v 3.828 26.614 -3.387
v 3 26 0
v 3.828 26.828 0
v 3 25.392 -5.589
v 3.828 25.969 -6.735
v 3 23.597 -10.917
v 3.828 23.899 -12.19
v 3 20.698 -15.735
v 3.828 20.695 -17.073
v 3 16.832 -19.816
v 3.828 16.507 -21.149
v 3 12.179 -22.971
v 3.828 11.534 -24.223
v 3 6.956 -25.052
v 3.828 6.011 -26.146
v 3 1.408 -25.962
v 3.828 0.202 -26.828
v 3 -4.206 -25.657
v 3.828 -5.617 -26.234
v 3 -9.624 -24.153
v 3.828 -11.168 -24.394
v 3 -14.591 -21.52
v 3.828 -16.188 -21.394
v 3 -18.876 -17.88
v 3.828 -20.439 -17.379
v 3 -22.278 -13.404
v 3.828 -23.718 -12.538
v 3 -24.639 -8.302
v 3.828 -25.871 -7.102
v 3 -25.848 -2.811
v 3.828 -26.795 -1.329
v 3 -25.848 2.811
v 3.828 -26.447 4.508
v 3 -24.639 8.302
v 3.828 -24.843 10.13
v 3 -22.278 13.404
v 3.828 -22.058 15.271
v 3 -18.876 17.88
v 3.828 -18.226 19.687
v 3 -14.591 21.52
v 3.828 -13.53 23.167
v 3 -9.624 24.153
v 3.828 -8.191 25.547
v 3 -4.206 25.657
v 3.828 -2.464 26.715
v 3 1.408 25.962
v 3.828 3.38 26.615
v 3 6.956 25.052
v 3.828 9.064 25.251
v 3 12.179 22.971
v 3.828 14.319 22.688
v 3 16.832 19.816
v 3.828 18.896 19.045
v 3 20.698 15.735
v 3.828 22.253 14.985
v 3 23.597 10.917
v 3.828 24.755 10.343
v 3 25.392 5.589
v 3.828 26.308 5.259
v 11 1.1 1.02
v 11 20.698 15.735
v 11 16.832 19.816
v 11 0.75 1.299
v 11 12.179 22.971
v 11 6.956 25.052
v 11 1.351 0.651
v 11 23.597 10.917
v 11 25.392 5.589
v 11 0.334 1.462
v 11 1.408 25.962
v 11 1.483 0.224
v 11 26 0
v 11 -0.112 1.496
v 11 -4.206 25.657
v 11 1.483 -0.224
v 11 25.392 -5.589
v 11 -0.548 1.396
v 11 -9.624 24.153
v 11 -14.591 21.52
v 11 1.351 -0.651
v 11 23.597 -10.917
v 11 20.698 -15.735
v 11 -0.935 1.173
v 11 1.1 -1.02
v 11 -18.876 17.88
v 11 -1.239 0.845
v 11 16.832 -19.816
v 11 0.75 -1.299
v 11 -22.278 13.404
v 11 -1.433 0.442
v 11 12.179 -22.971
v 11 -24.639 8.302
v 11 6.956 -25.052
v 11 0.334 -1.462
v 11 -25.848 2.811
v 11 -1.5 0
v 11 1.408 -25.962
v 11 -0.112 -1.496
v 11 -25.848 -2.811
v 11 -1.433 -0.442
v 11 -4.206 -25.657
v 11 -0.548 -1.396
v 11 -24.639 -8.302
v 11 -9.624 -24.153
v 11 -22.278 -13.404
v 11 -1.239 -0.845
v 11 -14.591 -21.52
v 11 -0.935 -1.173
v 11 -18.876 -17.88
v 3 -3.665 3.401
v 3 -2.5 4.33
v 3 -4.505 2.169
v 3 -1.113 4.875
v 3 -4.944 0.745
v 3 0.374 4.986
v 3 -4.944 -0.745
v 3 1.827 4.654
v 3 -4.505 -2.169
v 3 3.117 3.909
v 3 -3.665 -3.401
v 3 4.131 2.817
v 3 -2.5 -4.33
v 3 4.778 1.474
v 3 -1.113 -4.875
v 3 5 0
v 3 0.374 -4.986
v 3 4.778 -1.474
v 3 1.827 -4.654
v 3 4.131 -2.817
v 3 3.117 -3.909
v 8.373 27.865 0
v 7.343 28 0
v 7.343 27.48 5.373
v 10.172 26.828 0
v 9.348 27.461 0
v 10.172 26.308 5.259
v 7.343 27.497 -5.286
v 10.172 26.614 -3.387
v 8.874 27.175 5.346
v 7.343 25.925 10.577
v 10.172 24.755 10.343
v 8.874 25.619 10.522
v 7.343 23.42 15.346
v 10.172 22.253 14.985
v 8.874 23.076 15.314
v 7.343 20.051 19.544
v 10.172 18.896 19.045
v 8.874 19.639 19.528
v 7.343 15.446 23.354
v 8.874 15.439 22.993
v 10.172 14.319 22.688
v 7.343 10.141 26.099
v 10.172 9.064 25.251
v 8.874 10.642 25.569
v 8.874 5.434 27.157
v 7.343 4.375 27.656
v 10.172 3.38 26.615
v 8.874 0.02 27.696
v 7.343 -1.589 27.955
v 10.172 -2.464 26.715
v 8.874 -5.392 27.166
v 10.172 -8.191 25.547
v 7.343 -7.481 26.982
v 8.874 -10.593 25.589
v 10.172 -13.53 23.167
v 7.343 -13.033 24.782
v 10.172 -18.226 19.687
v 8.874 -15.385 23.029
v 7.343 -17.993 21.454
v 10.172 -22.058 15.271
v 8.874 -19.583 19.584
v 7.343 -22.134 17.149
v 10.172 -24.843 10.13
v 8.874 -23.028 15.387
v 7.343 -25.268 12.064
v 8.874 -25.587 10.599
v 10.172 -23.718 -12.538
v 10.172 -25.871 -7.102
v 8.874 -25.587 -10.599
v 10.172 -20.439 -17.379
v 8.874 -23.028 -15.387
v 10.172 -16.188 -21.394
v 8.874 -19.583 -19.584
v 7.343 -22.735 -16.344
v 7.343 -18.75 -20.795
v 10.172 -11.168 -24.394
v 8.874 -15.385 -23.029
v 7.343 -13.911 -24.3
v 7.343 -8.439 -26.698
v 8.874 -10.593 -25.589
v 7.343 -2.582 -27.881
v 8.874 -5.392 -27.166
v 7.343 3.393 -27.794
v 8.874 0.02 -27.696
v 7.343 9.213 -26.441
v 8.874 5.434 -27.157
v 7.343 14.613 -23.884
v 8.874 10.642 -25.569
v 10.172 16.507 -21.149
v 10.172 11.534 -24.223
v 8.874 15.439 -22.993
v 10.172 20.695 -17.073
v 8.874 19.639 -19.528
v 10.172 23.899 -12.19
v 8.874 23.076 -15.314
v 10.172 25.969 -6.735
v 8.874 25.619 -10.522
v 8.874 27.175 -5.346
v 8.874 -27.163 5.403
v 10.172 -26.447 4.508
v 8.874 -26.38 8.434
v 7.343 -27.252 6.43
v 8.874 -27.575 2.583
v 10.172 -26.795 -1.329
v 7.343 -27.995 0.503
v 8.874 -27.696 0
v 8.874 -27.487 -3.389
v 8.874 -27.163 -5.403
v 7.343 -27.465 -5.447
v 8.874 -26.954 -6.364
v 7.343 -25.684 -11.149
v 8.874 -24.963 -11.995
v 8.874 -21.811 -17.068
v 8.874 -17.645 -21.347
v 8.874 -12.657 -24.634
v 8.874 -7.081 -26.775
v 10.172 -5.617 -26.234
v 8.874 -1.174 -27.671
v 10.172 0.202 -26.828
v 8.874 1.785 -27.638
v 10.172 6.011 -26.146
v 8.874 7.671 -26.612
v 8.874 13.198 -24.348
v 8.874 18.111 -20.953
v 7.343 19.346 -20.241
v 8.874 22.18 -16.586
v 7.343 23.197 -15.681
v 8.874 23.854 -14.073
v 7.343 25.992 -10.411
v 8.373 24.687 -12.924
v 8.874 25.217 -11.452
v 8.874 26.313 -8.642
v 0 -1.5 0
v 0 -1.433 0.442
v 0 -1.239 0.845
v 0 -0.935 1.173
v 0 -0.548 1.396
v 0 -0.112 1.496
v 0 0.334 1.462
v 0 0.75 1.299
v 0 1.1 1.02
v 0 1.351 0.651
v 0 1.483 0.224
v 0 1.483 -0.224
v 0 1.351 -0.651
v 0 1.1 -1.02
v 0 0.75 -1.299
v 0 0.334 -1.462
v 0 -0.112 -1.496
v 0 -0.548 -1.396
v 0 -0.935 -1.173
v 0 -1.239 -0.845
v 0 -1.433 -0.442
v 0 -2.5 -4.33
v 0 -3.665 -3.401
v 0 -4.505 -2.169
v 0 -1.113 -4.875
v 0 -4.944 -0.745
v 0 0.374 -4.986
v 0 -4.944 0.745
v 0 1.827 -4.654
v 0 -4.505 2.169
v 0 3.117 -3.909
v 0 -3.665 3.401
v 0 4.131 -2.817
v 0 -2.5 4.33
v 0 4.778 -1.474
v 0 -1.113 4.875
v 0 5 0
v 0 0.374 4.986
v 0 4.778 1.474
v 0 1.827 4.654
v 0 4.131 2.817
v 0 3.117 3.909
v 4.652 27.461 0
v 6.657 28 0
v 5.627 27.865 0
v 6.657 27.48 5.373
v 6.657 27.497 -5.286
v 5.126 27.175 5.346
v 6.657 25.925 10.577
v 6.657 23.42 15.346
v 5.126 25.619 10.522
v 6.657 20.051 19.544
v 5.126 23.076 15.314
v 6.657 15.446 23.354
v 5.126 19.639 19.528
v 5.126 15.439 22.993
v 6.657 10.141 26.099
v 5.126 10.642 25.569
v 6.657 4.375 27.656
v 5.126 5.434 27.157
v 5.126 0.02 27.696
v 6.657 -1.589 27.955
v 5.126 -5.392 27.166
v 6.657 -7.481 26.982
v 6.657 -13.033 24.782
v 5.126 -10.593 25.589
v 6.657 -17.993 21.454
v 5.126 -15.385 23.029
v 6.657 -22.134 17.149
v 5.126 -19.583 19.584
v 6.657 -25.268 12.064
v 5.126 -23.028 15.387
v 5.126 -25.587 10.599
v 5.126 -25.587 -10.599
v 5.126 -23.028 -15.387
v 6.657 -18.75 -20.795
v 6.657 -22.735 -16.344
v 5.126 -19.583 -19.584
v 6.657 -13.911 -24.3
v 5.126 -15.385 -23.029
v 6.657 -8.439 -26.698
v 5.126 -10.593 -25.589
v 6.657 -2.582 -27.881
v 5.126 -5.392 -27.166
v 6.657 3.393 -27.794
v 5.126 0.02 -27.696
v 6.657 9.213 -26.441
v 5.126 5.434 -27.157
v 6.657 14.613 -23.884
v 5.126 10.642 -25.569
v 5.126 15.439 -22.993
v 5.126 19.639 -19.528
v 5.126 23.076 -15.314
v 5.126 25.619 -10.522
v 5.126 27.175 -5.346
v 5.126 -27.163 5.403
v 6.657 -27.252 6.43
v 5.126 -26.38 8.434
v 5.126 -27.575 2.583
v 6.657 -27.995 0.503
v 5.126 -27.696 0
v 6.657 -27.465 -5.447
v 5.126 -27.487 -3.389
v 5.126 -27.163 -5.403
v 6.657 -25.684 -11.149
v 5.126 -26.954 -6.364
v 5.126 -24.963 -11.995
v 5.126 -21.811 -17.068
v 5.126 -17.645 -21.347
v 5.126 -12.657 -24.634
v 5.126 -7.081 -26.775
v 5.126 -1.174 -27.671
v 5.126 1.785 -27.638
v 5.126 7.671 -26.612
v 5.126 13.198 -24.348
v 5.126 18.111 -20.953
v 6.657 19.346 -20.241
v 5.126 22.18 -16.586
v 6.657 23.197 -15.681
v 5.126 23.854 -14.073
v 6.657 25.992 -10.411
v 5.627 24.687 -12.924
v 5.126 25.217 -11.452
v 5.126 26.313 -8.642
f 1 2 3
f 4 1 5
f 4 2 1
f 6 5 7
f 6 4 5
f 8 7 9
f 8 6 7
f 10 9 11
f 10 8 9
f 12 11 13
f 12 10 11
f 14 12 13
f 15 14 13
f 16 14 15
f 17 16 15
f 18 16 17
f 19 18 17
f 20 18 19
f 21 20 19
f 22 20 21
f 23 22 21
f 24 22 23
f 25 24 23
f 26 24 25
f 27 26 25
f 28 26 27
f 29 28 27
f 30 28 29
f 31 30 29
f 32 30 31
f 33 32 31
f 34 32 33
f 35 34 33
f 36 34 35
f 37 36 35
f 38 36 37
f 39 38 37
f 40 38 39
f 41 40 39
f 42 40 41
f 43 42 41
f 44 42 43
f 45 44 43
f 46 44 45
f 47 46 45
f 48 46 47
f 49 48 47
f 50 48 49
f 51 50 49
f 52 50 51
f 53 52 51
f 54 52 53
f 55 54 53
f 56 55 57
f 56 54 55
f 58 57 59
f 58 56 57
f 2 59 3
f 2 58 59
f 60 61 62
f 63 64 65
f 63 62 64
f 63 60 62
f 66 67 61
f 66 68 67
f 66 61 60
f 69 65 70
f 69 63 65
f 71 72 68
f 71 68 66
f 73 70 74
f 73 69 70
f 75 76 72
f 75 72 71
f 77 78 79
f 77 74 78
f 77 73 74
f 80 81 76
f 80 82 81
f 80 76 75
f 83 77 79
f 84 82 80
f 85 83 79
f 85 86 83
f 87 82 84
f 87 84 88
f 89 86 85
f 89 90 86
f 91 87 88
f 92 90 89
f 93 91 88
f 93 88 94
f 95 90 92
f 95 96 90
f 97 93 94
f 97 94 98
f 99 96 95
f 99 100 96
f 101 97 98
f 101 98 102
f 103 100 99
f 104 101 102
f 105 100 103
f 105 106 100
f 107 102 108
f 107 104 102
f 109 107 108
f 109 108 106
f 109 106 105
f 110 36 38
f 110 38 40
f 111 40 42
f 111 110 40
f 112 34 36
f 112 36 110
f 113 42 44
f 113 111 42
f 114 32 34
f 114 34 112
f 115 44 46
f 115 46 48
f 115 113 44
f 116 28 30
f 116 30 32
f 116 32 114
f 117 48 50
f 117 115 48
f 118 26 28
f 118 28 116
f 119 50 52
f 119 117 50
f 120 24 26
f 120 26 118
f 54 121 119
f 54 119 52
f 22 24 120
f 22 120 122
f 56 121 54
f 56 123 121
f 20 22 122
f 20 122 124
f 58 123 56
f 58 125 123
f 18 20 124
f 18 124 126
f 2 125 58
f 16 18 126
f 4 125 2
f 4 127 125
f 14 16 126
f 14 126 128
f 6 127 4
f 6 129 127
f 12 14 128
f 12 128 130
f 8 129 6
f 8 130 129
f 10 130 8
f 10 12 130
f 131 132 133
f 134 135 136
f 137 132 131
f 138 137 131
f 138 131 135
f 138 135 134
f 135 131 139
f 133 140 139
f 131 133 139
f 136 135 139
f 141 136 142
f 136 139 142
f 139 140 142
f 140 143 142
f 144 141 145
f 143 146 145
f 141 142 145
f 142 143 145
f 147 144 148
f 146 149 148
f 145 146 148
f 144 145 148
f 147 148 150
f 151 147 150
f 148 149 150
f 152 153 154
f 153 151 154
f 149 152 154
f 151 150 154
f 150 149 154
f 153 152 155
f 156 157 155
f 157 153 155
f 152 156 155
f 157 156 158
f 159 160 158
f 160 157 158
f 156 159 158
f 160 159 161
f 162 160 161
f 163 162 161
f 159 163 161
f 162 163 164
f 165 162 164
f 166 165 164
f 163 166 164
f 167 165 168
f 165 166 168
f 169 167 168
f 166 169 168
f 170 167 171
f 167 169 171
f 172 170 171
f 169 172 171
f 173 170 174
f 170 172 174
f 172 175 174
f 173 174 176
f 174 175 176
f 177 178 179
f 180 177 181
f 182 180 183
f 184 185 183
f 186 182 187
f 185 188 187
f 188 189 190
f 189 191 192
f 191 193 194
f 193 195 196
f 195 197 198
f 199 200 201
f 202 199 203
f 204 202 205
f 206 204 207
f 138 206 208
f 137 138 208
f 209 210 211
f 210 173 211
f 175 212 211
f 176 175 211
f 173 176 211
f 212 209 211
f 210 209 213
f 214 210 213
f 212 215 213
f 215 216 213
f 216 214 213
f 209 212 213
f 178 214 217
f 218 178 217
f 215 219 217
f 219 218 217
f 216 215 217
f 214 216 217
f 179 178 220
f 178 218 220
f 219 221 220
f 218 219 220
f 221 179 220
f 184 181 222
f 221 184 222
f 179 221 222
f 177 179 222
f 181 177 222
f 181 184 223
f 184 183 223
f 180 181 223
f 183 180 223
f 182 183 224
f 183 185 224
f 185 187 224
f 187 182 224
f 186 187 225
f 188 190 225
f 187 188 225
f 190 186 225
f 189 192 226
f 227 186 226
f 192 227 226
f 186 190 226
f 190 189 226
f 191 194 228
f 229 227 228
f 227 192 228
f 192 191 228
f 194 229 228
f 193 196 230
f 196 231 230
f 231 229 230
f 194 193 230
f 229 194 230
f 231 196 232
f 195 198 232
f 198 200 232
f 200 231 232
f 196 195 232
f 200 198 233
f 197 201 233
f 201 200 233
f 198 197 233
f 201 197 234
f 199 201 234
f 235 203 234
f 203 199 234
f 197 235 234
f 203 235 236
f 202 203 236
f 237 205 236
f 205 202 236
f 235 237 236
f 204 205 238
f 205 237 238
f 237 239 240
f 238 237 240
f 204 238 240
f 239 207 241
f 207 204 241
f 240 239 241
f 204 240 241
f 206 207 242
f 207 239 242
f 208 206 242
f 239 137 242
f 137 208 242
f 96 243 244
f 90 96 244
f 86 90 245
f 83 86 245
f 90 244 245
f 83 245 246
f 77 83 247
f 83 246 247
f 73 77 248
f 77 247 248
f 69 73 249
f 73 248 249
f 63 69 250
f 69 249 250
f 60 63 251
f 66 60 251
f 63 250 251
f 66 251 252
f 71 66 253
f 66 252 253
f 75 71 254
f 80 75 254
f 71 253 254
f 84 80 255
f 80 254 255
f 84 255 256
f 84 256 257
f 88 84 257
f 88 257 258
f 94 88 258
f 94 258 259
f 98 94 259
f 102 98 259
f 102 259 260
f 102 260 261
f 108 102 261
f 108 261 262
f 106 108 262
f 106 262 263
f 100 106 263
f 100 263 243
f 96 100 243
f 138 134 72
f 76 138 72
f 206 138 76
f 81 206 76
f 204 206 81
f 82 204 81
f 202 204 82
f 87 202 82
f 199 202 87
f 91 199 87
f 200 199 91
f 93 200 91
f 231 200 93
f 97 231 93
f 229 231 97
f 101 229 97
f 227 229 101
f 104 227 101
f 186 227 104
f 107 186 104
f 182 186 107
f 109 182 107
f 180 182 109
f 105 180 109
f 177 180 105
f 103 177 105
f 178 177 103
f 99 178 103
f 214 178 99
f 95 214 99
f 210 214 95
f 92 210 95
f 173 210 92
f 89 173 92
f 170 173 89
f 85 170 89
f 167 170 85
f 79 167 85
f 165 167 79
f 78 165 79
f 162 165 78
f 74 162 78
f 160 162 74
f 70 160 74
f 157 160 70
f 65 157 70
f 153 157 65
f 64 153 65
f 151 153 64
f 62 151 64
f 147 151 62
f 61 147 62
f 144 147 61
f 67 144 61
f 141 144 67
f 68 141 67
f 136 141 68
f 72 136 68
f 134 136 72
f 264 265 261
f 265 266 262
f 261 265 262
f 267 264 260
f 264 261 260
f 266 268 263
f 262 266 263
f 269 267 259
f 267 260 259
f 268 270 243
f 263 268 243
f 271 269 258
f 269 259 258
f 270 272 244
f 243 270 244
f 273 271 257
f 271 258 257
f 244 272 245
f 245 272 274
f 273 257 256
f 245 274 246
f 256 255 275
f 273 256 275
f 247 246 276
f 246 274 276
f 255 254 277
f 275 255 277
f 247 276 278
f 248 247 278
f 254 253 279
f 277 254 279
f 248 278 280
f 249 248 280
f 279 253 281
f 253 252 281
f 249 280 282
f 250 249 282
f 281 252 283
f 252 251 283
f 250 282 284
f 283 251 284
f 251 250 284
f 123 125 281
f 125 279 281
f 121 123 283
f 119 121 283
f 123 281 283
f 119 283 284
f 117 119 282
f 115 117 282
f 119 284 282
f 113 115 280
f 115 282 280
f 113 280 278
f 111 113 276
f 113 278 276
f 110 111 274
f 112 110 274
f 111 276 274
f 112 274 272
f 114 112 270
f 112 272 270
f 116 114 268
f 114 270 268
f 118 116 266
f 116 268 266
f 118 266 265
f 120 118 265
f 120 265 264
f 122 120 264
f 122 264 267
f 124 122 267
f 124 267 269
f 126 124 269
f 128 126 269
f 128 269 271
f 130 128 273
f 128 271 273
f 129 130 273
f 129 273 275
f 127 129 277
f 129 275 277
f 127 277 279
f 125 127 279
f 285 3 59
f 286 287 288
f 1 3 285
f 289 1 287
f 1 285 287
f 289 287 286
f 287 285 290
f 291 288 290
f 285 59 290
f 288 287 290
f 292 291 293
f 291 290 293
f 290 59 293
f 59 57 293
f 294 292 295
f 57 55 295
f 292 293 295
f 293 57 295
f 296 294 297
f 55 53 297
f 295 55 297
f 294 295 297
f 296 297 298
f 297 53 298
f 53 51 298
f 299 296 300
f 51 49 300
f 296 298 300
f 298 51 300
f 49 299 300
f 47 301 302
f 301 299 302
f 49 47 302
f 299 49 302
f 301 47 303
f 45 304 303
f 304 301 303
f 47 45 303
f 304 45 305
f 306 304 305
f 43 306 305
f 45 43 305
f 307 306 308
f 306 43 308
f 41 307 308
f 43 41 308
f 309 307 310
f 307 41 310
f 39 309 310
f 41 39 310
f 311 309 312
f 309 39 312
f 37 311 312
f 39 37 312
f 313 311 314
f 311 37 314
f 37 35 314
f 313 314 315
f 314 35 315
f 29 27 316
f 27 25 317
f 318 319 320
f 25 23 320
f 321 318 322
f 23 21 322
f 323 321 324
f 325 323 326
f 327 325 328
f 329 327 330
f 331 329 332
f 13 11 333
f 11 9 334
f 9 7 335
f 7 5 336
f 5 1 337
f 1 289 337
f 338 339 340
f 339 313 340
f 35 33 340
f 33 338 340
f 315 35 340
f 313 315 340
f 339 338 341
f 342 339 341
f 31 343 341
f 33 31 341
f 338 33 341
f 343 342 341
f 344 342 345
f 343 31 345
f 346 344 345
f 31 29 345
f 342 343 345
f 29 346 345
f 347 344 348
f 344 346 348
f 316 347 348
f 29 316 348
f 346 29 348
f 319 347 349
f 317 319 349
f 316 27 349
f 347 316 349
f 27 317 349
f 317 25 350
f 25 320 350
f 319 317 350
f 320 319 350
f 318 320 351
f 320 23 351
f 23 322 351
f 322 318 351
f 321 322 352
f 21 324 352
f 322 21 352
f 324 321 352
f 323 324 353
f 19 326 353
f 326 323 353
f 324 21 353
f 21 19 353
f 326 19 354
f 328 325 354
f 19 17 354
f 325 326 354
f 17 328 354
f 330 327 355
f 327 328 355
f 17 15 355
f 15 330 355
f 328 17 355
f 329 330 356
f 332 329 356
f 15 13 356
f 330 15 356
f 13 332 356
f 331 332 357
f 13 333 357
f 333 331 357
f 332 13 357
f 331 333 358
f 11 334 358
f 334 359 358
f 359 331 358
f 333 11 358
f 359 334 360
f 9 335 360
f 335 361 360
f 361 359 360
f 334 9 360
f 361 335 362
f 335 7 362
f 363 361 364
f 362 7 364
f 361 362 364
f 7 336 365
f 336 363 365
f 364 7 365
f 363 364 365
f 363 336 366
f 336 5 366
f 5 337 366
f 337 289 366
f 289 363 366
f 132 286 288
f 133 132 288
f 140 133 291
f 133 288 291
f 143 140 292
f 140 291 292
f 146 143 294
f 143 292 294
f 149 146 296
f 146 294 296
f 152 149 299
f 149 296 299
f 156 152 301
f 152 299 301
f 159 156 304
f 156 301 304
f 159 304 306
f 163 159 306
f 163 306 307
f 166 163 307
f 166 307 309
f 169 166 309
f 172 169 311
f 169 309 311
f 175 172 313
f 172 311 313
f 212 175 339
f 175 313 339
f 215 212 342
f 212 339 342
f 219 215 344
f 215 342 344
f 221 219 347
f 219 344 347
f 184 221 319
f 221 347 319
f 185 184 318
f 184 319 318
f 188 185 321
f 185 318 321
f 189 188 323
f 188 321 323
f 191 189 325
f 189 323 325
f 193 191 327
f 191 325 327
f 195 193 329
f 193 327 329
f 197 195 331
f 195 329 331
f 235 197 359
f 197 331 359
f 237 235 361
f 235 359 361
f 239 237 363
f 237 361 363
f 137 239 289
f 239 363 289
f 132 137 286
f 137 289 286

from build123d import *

# Parameters (mm, degrees)
F2_R     = 1.5
F3_DEPTH = 25
F7_R     = 4


with BuildPart() as f1:
    # F0 (on Top) → F1 (revolve)
    with BuildSketch(Plane.XY):
        Polygon((0, 5), (0, 0), (11, 0), (11, 25), (9, 25), (9, 28), (5, 28), (5, 25), (3, 25), (3, 5), align=None)
    revolve(axis=Axis((5.5, 0, 0), (1, 0, 0)))

    # F2 (on face) → F3 (cut)
    with BuildSketch(Plane(origin=(0, 0, 0), x_dir=(0, -1, 0), z_dir=(-1, 0, 0))):
        Circle(F2_R)
    extrude(amount=-F3_DEPTH, mode=Mode.SUBTRACT)

    # F5 (on Top) → F6 (revolve)
    with BuildSketch(Plane.XY):
        Polygon((3, 25), (11, 25), (11, 26), (9, 28), (5, 28), (3, 26), align=None)
    revolve(axis=Axis((0, 0, 0), (-1, 0, 0)))

    # F7
    f7_edges = [f1.edges().sort_by_distance(p)[0] for p in [
        (9, -28, 0),
        (5, -28, 0),
    ]]
    fillet(f7_edges, radius=F7_R)


solid = f1.part
